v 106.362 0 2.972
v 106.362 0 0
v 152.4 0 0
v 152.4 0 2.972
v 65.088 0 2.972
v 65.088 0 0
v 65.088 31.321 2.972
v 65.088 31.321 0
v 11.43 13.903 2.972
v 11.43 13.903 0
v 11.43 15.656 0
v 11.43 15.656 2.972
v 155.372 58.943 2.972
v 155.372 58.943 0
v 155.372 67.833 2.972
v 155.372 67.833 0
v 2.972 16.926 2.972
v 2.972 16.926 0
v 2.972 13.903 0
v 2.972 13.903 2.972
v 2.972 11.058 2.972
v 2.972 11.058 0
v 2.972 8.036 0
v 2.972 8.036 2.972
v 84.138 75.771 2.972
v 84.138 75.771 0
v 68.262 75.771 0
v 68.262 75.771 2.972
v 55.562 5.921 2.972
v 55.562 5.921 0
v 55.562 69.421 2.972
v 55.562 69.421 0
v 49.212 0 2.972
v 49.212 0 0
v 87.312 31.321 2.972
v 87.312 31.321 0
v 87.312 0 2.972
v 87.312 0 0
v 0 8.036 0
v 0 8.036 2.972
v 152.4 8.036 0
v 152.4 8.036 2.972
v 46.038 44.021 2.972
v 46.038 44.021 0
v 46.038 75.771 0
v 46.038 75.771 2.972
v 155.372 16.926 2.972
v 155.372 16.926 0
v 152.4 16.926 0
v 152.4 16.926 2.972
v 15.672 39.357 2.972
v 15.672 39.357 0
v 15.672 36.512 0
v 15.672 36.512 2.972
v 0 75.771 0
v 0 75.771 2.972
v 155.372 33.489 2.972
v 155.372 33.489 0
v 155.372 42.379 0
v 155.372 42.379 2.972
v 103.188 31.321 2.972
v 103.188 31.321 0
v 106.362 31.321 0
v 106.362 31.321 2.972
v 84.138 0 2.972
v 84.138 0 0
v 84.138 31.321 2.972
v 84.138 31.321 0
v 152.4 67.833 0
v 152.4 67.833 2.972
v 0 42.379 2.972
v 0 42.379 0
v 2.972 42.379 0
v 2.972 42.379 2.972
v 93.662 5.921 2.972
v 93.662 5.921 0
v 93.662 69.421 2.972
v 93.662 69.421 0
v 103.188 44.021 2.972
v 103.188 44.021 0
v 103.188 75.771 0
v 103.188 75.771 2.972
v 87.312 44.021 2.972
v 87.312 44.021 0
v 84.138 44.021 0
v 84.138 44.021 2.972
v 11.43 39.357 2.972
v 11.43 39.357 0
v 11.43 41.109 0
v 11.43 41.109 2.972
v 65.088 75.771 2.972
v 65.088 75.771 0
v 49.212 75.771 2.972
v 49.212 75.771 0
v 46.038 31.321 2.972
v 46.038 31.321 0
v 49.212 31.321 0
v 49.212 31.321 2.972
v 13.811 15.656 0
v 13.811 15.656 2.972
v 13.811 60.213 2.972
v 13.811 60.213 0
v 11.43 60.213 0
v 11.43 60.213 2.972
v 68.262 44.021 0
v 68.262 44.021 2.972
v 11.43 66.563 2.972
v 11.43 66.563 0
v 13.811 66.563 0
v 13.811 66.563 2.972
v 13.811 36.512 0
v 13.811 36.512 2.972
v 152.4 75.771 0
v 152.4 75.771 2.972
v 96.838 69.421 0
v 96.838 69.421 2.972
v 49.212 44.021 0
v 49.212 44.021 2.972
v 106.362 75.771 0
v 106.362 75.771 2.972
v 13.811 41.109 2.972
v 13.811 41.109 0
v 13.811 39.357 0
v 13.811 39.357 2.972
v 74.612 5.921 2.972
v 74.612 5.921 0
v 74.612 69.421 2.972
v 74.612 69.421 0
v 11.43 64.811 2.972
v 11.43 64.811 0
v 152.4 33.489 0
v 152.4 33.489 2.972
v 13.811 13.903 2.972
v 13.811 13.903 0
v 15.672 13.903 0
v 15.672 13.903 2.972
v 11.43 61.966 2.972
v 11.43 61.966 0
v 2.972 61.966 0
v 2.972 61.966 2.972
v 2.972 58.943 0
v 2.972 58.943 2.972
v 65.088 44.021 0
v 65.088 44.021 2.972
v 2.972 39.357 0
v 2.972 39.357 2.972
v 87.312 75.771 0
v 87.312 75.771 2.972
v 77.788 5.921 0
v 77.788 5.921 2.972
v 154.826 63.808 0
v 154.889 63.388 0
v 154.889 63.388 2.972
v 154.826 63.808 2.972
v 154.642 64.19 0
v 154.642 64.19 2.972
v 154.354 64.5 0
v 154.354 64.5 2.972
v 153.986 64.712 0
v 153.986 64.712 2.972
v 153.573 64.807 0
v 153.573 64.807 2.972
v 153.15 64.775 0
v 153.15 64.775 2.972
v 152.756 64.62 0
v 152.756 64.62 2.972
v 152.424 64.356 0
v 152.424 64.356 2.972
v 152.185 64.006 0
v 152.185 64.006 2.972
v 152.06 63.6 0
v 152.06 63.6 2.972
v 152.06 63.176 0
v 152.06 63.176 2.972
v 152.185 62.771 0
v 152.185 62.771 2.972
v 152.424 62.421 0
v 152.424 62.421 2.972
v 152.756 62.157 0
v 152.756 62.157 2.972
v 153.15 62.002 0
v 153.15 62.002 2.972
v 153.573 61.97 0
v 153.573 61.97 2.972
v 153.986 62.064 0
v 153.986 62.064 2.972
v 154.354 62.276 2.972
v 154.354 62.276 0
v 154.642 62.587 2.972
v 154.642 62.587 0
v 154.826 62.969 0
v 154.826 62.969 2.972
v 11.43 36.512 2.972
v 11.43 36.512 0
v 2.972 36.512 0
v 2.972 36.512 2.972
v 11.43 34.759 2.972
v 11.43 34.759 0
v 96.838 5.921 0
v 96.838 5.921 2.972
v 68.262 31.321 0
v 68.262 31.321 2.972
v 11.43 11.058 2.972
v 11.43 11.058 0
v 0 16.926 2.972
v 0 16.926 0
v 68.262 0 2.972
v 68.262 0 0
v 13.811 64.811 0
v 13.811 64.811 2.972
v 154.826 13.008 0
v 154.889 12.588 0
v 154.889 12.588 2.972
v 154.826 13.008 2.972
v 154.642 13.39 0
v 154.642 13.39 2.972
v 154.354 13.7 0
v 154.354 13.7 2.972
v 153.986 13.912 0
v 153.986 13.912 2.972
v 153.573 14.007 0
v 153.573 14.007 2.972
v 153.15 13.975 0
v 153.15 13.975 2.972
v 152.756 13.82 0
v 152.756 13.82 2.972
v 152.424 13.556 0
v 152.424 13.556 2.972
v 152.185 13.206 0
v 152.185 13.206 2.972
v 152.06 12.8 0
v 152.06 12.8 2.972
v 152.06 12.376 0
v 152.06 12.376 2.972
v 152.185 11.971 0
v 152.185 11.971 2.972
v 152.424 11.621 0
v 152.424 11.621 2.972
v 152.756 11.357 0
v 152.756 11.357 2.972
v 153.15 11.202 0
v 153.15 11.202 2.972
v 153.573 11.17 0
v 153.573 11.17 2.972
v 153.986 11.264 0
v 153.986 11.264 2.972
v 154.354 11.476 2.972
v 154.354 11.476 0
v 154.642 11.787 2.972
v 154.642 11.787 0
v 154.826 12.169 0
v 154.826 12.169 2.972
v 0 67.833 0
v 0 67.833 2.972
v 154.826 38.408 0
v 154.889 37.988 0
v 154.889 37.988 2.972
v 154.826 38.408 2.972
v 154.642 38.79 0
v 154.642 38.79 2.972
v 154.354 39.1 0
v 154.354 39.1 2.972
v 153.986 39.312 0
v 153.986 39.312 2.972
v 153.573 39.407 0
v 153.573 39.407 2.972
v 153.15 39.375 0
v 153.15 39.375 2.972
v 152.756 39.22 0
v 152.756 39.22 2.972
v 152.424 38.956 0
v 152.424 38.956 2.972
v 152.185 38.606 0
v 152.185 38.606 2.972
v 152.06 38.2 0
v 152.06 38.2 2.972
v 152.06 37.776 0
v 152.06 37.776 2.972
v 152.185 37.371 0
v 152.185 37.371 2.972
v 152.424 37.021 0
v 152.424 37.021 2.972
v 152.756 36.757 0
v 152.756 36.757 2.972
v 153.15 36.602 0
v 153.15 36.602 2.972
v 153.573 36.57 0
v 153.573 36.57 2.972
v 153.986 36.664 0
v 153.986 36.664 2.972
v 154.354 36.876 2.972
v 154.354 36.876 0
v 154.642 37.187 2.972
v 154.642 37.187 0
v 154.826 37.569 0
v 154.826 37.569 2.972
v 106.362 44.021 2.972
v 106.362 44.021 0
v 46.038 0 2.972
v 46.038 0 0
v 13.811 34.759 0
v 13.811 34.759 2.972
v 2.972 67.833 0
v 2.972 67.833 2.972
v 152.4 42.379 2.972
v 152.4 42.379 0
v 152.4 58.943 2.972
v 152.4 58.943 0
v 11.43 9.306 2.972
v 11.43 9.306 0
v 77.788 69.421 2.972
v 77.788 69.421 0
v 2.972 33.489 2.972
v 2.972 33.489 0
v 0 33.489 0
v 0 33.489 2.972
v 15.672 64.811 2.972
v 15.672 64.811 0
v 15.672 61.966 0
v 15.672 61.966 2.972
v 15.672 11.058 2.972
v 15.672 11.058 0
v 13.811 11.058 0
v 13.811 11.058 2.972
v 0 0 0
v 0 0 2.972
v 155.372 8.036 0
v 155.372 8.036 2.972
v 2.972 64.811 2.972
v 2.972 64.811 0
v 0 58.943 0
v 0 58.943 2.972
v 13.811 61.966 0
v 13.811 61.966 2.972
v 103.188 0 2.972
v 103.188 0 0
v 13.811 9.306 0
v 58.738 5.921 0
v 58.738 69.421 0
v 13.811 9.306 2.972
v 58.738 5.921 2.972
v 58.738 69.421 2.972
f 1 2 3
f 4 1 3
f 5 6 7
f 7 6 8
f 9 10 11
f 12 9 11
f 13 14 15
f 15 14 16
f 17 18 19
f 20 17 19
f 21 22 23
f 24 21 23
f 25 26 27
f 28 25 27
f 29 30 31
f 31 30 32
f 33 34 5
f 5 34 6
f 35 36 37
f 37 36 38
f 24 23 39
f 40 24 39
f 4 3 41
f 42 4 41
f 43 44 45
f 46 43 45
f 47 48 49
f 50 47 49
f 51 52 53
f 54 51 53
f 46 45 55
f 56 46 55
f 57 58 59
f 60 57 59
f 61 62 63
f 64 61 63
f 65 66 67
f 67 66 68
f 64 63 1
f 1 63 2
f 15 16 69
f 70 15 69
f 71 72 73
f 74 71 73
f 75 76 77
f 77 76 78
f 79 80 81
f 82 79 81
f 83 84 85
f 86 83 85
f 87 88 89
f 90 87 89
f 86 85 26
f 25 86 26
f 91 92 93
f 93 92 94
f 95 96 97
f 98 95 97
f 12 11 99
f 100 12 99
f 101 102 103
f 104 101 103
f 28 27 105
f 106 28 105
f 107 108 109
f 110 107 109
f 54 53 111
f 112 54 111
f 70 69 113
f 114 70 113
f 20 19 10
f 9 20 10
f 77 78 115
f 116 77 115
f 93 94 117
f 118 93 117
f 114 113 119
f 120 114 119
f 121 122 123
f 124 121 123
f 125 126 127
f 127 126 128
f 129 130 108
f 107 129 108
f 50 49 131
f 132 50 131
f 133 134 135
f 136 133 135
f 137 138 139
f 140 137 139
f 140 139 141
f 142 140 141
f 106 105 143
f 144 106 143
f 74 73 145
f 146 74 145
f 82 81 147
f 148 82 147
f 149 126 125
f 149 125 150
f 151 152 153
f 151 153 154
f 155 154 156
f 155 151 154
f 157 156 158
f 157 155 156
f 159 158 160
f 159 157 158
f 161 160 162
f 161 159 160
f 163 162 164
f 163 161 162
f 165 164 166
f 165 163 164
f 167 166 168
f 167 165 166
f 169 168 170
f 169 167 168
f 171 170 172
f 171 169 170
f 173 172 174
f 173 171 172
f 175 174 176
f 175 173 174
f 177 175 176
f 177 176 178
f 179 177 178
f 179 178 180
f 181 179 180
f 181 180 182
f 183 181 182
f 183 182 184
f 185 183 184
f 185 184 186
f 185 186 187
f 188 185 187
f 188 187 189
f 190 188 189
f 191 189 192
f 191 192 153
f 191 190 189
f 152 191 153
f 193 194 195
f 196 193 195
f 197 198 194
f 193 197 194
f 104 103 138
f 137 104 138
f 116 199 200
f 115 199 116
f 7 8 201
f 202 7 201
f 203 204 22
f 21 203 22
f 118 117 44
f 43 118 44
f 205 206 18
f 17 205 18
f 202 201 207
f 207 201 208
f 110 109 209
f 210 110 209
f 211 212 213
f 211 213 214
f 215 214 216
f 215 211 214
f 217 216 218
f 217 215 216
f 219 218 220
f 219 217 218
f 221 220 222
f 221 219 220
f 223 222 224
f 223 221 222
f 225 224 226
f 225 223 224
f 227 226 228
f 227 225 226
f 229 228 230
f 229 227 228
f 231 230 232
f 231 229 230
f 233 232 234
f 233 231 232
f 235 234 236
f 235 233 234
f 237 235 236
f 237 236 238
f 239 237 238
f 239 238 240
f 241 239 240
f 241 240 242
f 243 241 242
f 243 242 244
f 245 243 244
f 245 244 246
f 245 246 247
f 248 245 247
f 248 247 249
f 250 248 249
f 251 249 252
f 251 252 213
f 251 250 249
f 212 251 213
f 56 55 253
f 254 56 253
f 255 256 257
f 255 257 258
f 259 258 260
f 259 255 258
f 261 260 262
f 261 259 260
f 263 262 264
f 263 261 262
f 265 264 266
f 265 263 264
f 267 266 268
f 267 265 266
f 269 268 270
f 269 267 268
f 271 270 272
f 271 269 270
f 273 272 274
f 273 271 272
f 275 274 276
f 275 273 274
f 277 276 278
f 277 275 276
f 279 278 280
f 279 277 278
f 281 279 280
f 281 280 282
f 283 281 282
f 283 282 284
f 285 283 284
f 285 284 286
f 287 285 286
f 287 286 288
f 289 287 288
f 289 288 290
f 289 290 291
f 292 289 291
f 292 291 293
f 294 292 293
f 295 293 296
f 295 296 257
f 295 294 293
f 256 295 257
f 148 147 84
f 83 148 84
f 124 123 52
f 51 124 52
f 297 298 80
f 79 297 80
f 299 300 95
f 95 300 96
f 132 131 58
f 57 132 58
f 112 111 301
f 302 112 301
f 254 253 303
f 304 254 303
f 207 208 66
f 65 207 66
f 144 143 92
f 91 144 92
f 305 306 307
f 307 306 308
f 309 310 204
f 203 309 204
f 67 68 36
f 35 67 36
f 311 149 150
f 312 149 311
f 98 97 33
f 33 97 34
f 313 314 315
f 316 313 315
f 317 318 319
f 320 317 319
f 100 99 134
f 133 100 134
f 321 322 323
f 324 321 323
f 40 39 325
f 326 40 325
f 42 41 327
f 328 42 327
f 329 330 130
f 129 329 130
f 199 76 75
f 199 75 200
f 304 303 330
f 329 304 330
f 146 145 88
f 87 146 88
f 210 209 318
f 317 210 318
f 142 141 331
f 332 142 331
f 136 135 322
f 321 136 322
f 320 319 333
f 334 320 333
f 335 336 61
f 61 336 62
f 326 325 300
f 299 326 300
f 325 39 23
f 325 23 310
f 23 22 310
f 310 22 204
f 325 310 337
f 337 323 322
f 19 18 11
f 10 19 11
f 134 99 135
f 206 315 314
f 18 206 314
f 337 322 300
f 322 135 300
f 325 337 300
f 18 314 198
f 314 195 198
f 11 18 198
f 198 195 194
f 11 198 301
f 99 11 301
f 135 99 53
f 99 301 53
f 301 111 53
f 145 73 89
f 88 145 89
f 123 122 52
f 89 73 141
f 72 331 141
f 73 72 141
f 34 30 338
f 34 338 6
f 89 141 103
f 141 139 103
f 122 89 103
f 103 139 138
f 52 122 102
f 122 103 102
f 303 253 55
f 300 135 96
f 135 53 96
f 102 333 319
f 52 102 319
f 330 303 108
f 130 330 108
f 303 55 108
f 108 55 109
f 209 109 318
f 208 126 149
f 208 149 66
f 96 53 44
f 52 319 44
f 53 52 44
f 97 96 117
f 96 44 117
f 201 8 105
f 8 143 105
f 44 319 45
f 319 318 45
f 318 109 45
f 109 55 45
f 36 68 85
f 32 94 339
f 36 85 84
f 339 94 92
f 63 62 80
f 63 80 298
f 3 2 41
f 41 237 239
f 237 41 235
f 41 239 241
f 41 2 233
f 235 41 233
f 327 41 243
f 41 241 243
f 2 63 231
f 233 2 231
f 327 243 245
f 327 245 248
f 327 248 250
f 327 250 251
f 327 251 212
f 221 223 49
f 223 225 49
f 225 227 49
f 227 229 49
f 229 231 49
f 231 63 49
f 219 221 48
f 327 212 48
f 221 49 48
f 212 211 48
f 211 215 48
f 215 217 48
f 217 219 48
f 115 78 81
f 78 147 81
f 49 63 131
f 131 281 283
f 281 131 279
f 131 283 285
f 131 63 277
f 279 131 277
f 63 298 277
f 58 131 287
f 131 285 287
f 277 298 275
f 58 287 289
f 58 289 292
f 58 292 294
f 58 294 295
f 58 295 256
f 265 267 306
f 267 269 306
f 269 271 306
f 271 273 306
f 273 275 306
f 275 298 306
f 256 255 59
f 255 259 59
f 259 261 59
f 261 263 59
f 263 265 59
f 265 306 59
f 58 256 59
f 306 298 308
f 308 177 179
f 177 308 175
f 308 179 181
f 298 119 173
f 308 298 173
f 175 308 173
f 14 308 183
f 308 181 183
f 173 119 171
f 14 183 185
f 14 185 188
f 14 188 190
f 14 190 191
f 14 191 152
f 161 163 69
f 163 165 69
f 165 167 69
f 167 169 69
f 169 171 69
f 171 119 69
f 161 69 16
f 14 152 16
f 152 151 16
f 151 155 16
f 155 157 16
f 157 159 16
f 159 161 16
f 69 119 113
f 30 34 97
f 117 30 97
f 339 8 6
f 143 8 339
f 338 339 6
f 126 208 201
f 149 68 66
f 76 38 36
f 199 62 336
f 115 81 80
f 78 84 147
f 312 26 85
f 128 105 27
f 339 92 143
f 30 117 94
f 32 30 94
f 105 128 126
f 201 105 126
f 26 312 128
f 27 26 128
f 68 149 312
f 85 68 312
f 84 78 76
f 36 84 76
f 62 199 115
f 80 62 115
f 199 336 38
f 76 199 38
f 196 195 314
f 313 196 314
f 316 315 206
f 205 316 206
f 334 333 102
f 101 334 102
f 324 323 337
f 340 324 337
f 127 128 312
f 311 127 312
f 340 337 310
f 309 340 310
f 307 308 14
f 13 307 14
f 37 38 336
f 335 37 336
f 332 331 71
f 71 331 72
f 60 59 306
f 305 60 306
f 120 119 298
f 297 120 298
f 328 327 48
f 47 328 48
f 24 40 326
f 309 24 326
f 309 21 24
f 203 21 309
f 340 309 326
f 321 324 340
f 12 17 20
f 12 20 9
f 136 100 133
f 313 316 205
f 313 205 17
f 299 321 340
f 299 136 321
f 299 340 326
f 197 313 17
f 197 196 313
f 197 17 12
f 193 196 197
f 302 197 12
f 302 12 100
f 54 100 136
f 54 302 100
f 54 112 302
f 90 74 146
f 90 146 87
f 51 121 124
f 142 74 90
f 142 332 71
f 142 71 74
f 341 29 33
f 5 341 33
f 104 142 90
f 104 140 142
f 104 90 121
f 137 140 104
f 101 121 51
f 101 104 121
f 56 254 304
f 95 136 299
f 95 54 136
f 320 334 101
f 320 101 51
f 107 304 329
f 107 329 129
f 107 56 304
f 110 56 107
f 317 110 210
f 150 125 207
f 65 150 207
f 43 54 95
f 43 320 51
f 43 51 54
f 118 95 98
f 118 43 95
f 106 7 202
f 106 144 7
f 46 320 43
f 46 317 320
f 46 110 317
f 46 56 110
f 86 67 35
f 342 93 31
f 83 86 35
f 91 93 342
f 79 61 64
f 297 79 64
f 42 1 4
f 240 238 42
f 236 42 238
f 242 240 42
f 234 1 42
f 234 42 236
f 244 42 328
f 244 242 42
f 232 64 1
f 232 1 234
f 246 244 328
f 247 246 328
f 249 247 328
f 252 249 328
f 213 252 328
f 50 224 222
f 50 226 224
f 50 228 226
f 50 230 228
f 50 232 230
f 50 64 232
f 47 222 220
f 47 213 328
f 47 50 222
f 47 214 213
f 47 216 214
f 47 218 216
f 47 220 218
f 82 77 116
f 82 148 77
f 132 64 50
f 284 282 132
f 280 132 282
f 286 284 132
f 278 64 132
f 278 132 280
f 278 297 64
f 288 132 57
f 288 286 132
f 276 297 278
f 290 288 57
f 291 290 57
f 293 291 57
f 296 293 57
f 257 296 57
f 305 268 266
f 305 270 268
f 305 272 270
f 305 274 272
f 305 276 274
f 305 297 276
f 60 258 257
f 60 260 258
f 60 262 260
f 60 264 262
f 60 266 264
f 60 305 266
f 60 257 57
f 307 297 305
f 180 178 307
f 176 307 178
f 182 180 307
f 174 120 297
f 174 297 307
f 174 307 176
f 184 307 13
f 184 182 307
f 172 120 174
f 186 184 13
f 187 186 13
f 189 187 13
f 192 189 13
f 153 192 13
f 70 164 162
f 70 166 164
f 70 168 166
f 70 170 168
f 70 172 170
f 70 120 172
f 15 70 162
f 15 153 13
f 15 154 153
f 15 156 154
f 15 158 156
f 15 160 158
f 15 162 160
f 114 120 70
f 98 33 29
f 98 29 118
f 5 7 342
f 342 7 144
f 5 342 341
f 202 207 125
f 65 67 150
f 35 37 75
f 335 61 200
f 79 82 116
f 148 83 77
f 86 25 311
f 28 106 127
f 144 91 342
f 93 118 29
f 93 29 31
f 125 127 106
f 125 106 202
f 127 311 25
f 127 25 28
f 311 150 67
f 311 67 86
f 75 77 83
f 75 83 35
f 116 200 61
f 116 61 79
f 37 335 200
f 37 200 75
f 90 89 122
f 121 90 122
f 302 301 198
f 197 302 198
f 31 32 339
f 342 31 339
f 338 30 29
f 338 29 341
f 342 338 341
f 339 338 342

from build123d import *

# Parameters (mm, degrees)
F0_W     = 3.175
F0_H     = 63.5
F0_R     = 1.4224
F1_DEPTH = 2.9718


with BuildPart() as f1:
    # F0 (on Top) → F1 (new body)
    with BuildSketch(Plane.XY):
        Polygon((0, 8.035559), (0, 0), (46.0375, 0), (46.0375, 31.32091), (49.2125, 31.32091), (49.2125, 0), (65.0875, 0), (65.0875, 31.32091), (68.2625, 31.32091), (68.2625, 0), (84.1375, 0), (84.1375, 31.32091), (87.3125, 31.32091), (87.3125, 0), (103.1875, 0), (103.1875, 31.32091), (106.3625, 31.32091), (106.3625, 0), (152.4, 0), (152.4, 8.035554), (155.3718, 8.035554), (155.3718, 11.058159), (155.3718, 13.902959), (155.3718, 16.925564), (152.4, 16.925564), (152.4, 33.489475), (155.3718, 33.489475), (155.3718, 36.51208), (155.3718, 39.35688), (155.3718, 42.379485), (152.4, 42.379485), (152.4, 58.943395), (155.3718, 58.943395), (155.3718, 61.966), (155.3718, 64.8108), (155.3718, 67.833405), (152.4, 67.833405), (152.4, 75.77091), (106.3625, 75.77091), (106.3625, 44.02091), (103.1875, 44.02091), (103.1875, 75.77091), (87.3125, 75.77091), (87.3125, 44.02091), (84.1375, 44.02091), (84.1375, 75.77091), (68.2625, 75.77091), (68.2625, 44.02091), (65.0875, 44.02091), (65.0875, 75.77091), (49.2125, 75.77091), (49.2125, 44.02091), (46.0375, 44.02091), (46.0375, 75.77091), (0, 75.77091), (0, 67.83341), (2.9718, 67.83341), (2.9718, 64.810805), (11.43, 64.810805), (11.43, 66.563405), (13.81125, 66.563405), (13.81125, 64.810805), (15.6718, 64.810805), (15.6718, 61.966005), (13.81125, 61.966005), (13.81125, 60.213405), (11.43, 60.213405), (11.43, 61.966005), (2.9718, 61.966005), (2.9718, 58.9434), (0, 58.9434), (0, 42.37949), (2.9718, 42.37949), (2.9718, 39.356885), (11.43, 39.356885), (11.43, 41.109485), (13.81125, 41.109485), (13.81125, 39.356885), (15.6718, 39.356885), (15.6718, 36.512085), (13.81125, 36.512085), (13.81125, 34.759485), (11.43, 34.759485), (11.43, 36.512085), (2.9718, 36.512085), (2.9718, 33.48948), (0, 33.48948), (0, 16.925569), (2.9718, 16.925569), (2.9718, 13.902964), (11.43, 13.902964), (11.43, 15.655564), (13.81125, 15.655564), (13.81125, 13.902964), (15.6718, 13.902964), (15.6718, 11.058164), (13.81125, 11.058164), (13.81125, 9.305564), (11.43, 9.305564), (11.43, 11.058164), (2.9718, 11.058164), (2.9718, 8.035559), align=None)
        with Locations((57.15, 37.67091)):
            Rectangle(F0_W, F0_H, mode=Mode.SUBTRACT)
        with Locations((76.2, 37.67091)):
            Rectangle(F0_W, F0_H, mode=Mode.SUBTRACT)
        with Locations((153.4668, 12.588405)):
            Circle(F0_R, mode=Mode.SUBTRACT)
        with Locations((95.25, 37.67091)):
            Rectangle(F0_W, F0_H, mode=Mode.SUBTRACT)
        with Locations((153.4668, 37.988405)):
            Circle(F0_R, mode=Mode.SUBTRACT)
        with Locations((153.4668, 63.388405)):
            Circle(F0_R, mode=Mode.SUBTRACT)
    extrude(amount=F1_DEPTH)


solid = f1.part
